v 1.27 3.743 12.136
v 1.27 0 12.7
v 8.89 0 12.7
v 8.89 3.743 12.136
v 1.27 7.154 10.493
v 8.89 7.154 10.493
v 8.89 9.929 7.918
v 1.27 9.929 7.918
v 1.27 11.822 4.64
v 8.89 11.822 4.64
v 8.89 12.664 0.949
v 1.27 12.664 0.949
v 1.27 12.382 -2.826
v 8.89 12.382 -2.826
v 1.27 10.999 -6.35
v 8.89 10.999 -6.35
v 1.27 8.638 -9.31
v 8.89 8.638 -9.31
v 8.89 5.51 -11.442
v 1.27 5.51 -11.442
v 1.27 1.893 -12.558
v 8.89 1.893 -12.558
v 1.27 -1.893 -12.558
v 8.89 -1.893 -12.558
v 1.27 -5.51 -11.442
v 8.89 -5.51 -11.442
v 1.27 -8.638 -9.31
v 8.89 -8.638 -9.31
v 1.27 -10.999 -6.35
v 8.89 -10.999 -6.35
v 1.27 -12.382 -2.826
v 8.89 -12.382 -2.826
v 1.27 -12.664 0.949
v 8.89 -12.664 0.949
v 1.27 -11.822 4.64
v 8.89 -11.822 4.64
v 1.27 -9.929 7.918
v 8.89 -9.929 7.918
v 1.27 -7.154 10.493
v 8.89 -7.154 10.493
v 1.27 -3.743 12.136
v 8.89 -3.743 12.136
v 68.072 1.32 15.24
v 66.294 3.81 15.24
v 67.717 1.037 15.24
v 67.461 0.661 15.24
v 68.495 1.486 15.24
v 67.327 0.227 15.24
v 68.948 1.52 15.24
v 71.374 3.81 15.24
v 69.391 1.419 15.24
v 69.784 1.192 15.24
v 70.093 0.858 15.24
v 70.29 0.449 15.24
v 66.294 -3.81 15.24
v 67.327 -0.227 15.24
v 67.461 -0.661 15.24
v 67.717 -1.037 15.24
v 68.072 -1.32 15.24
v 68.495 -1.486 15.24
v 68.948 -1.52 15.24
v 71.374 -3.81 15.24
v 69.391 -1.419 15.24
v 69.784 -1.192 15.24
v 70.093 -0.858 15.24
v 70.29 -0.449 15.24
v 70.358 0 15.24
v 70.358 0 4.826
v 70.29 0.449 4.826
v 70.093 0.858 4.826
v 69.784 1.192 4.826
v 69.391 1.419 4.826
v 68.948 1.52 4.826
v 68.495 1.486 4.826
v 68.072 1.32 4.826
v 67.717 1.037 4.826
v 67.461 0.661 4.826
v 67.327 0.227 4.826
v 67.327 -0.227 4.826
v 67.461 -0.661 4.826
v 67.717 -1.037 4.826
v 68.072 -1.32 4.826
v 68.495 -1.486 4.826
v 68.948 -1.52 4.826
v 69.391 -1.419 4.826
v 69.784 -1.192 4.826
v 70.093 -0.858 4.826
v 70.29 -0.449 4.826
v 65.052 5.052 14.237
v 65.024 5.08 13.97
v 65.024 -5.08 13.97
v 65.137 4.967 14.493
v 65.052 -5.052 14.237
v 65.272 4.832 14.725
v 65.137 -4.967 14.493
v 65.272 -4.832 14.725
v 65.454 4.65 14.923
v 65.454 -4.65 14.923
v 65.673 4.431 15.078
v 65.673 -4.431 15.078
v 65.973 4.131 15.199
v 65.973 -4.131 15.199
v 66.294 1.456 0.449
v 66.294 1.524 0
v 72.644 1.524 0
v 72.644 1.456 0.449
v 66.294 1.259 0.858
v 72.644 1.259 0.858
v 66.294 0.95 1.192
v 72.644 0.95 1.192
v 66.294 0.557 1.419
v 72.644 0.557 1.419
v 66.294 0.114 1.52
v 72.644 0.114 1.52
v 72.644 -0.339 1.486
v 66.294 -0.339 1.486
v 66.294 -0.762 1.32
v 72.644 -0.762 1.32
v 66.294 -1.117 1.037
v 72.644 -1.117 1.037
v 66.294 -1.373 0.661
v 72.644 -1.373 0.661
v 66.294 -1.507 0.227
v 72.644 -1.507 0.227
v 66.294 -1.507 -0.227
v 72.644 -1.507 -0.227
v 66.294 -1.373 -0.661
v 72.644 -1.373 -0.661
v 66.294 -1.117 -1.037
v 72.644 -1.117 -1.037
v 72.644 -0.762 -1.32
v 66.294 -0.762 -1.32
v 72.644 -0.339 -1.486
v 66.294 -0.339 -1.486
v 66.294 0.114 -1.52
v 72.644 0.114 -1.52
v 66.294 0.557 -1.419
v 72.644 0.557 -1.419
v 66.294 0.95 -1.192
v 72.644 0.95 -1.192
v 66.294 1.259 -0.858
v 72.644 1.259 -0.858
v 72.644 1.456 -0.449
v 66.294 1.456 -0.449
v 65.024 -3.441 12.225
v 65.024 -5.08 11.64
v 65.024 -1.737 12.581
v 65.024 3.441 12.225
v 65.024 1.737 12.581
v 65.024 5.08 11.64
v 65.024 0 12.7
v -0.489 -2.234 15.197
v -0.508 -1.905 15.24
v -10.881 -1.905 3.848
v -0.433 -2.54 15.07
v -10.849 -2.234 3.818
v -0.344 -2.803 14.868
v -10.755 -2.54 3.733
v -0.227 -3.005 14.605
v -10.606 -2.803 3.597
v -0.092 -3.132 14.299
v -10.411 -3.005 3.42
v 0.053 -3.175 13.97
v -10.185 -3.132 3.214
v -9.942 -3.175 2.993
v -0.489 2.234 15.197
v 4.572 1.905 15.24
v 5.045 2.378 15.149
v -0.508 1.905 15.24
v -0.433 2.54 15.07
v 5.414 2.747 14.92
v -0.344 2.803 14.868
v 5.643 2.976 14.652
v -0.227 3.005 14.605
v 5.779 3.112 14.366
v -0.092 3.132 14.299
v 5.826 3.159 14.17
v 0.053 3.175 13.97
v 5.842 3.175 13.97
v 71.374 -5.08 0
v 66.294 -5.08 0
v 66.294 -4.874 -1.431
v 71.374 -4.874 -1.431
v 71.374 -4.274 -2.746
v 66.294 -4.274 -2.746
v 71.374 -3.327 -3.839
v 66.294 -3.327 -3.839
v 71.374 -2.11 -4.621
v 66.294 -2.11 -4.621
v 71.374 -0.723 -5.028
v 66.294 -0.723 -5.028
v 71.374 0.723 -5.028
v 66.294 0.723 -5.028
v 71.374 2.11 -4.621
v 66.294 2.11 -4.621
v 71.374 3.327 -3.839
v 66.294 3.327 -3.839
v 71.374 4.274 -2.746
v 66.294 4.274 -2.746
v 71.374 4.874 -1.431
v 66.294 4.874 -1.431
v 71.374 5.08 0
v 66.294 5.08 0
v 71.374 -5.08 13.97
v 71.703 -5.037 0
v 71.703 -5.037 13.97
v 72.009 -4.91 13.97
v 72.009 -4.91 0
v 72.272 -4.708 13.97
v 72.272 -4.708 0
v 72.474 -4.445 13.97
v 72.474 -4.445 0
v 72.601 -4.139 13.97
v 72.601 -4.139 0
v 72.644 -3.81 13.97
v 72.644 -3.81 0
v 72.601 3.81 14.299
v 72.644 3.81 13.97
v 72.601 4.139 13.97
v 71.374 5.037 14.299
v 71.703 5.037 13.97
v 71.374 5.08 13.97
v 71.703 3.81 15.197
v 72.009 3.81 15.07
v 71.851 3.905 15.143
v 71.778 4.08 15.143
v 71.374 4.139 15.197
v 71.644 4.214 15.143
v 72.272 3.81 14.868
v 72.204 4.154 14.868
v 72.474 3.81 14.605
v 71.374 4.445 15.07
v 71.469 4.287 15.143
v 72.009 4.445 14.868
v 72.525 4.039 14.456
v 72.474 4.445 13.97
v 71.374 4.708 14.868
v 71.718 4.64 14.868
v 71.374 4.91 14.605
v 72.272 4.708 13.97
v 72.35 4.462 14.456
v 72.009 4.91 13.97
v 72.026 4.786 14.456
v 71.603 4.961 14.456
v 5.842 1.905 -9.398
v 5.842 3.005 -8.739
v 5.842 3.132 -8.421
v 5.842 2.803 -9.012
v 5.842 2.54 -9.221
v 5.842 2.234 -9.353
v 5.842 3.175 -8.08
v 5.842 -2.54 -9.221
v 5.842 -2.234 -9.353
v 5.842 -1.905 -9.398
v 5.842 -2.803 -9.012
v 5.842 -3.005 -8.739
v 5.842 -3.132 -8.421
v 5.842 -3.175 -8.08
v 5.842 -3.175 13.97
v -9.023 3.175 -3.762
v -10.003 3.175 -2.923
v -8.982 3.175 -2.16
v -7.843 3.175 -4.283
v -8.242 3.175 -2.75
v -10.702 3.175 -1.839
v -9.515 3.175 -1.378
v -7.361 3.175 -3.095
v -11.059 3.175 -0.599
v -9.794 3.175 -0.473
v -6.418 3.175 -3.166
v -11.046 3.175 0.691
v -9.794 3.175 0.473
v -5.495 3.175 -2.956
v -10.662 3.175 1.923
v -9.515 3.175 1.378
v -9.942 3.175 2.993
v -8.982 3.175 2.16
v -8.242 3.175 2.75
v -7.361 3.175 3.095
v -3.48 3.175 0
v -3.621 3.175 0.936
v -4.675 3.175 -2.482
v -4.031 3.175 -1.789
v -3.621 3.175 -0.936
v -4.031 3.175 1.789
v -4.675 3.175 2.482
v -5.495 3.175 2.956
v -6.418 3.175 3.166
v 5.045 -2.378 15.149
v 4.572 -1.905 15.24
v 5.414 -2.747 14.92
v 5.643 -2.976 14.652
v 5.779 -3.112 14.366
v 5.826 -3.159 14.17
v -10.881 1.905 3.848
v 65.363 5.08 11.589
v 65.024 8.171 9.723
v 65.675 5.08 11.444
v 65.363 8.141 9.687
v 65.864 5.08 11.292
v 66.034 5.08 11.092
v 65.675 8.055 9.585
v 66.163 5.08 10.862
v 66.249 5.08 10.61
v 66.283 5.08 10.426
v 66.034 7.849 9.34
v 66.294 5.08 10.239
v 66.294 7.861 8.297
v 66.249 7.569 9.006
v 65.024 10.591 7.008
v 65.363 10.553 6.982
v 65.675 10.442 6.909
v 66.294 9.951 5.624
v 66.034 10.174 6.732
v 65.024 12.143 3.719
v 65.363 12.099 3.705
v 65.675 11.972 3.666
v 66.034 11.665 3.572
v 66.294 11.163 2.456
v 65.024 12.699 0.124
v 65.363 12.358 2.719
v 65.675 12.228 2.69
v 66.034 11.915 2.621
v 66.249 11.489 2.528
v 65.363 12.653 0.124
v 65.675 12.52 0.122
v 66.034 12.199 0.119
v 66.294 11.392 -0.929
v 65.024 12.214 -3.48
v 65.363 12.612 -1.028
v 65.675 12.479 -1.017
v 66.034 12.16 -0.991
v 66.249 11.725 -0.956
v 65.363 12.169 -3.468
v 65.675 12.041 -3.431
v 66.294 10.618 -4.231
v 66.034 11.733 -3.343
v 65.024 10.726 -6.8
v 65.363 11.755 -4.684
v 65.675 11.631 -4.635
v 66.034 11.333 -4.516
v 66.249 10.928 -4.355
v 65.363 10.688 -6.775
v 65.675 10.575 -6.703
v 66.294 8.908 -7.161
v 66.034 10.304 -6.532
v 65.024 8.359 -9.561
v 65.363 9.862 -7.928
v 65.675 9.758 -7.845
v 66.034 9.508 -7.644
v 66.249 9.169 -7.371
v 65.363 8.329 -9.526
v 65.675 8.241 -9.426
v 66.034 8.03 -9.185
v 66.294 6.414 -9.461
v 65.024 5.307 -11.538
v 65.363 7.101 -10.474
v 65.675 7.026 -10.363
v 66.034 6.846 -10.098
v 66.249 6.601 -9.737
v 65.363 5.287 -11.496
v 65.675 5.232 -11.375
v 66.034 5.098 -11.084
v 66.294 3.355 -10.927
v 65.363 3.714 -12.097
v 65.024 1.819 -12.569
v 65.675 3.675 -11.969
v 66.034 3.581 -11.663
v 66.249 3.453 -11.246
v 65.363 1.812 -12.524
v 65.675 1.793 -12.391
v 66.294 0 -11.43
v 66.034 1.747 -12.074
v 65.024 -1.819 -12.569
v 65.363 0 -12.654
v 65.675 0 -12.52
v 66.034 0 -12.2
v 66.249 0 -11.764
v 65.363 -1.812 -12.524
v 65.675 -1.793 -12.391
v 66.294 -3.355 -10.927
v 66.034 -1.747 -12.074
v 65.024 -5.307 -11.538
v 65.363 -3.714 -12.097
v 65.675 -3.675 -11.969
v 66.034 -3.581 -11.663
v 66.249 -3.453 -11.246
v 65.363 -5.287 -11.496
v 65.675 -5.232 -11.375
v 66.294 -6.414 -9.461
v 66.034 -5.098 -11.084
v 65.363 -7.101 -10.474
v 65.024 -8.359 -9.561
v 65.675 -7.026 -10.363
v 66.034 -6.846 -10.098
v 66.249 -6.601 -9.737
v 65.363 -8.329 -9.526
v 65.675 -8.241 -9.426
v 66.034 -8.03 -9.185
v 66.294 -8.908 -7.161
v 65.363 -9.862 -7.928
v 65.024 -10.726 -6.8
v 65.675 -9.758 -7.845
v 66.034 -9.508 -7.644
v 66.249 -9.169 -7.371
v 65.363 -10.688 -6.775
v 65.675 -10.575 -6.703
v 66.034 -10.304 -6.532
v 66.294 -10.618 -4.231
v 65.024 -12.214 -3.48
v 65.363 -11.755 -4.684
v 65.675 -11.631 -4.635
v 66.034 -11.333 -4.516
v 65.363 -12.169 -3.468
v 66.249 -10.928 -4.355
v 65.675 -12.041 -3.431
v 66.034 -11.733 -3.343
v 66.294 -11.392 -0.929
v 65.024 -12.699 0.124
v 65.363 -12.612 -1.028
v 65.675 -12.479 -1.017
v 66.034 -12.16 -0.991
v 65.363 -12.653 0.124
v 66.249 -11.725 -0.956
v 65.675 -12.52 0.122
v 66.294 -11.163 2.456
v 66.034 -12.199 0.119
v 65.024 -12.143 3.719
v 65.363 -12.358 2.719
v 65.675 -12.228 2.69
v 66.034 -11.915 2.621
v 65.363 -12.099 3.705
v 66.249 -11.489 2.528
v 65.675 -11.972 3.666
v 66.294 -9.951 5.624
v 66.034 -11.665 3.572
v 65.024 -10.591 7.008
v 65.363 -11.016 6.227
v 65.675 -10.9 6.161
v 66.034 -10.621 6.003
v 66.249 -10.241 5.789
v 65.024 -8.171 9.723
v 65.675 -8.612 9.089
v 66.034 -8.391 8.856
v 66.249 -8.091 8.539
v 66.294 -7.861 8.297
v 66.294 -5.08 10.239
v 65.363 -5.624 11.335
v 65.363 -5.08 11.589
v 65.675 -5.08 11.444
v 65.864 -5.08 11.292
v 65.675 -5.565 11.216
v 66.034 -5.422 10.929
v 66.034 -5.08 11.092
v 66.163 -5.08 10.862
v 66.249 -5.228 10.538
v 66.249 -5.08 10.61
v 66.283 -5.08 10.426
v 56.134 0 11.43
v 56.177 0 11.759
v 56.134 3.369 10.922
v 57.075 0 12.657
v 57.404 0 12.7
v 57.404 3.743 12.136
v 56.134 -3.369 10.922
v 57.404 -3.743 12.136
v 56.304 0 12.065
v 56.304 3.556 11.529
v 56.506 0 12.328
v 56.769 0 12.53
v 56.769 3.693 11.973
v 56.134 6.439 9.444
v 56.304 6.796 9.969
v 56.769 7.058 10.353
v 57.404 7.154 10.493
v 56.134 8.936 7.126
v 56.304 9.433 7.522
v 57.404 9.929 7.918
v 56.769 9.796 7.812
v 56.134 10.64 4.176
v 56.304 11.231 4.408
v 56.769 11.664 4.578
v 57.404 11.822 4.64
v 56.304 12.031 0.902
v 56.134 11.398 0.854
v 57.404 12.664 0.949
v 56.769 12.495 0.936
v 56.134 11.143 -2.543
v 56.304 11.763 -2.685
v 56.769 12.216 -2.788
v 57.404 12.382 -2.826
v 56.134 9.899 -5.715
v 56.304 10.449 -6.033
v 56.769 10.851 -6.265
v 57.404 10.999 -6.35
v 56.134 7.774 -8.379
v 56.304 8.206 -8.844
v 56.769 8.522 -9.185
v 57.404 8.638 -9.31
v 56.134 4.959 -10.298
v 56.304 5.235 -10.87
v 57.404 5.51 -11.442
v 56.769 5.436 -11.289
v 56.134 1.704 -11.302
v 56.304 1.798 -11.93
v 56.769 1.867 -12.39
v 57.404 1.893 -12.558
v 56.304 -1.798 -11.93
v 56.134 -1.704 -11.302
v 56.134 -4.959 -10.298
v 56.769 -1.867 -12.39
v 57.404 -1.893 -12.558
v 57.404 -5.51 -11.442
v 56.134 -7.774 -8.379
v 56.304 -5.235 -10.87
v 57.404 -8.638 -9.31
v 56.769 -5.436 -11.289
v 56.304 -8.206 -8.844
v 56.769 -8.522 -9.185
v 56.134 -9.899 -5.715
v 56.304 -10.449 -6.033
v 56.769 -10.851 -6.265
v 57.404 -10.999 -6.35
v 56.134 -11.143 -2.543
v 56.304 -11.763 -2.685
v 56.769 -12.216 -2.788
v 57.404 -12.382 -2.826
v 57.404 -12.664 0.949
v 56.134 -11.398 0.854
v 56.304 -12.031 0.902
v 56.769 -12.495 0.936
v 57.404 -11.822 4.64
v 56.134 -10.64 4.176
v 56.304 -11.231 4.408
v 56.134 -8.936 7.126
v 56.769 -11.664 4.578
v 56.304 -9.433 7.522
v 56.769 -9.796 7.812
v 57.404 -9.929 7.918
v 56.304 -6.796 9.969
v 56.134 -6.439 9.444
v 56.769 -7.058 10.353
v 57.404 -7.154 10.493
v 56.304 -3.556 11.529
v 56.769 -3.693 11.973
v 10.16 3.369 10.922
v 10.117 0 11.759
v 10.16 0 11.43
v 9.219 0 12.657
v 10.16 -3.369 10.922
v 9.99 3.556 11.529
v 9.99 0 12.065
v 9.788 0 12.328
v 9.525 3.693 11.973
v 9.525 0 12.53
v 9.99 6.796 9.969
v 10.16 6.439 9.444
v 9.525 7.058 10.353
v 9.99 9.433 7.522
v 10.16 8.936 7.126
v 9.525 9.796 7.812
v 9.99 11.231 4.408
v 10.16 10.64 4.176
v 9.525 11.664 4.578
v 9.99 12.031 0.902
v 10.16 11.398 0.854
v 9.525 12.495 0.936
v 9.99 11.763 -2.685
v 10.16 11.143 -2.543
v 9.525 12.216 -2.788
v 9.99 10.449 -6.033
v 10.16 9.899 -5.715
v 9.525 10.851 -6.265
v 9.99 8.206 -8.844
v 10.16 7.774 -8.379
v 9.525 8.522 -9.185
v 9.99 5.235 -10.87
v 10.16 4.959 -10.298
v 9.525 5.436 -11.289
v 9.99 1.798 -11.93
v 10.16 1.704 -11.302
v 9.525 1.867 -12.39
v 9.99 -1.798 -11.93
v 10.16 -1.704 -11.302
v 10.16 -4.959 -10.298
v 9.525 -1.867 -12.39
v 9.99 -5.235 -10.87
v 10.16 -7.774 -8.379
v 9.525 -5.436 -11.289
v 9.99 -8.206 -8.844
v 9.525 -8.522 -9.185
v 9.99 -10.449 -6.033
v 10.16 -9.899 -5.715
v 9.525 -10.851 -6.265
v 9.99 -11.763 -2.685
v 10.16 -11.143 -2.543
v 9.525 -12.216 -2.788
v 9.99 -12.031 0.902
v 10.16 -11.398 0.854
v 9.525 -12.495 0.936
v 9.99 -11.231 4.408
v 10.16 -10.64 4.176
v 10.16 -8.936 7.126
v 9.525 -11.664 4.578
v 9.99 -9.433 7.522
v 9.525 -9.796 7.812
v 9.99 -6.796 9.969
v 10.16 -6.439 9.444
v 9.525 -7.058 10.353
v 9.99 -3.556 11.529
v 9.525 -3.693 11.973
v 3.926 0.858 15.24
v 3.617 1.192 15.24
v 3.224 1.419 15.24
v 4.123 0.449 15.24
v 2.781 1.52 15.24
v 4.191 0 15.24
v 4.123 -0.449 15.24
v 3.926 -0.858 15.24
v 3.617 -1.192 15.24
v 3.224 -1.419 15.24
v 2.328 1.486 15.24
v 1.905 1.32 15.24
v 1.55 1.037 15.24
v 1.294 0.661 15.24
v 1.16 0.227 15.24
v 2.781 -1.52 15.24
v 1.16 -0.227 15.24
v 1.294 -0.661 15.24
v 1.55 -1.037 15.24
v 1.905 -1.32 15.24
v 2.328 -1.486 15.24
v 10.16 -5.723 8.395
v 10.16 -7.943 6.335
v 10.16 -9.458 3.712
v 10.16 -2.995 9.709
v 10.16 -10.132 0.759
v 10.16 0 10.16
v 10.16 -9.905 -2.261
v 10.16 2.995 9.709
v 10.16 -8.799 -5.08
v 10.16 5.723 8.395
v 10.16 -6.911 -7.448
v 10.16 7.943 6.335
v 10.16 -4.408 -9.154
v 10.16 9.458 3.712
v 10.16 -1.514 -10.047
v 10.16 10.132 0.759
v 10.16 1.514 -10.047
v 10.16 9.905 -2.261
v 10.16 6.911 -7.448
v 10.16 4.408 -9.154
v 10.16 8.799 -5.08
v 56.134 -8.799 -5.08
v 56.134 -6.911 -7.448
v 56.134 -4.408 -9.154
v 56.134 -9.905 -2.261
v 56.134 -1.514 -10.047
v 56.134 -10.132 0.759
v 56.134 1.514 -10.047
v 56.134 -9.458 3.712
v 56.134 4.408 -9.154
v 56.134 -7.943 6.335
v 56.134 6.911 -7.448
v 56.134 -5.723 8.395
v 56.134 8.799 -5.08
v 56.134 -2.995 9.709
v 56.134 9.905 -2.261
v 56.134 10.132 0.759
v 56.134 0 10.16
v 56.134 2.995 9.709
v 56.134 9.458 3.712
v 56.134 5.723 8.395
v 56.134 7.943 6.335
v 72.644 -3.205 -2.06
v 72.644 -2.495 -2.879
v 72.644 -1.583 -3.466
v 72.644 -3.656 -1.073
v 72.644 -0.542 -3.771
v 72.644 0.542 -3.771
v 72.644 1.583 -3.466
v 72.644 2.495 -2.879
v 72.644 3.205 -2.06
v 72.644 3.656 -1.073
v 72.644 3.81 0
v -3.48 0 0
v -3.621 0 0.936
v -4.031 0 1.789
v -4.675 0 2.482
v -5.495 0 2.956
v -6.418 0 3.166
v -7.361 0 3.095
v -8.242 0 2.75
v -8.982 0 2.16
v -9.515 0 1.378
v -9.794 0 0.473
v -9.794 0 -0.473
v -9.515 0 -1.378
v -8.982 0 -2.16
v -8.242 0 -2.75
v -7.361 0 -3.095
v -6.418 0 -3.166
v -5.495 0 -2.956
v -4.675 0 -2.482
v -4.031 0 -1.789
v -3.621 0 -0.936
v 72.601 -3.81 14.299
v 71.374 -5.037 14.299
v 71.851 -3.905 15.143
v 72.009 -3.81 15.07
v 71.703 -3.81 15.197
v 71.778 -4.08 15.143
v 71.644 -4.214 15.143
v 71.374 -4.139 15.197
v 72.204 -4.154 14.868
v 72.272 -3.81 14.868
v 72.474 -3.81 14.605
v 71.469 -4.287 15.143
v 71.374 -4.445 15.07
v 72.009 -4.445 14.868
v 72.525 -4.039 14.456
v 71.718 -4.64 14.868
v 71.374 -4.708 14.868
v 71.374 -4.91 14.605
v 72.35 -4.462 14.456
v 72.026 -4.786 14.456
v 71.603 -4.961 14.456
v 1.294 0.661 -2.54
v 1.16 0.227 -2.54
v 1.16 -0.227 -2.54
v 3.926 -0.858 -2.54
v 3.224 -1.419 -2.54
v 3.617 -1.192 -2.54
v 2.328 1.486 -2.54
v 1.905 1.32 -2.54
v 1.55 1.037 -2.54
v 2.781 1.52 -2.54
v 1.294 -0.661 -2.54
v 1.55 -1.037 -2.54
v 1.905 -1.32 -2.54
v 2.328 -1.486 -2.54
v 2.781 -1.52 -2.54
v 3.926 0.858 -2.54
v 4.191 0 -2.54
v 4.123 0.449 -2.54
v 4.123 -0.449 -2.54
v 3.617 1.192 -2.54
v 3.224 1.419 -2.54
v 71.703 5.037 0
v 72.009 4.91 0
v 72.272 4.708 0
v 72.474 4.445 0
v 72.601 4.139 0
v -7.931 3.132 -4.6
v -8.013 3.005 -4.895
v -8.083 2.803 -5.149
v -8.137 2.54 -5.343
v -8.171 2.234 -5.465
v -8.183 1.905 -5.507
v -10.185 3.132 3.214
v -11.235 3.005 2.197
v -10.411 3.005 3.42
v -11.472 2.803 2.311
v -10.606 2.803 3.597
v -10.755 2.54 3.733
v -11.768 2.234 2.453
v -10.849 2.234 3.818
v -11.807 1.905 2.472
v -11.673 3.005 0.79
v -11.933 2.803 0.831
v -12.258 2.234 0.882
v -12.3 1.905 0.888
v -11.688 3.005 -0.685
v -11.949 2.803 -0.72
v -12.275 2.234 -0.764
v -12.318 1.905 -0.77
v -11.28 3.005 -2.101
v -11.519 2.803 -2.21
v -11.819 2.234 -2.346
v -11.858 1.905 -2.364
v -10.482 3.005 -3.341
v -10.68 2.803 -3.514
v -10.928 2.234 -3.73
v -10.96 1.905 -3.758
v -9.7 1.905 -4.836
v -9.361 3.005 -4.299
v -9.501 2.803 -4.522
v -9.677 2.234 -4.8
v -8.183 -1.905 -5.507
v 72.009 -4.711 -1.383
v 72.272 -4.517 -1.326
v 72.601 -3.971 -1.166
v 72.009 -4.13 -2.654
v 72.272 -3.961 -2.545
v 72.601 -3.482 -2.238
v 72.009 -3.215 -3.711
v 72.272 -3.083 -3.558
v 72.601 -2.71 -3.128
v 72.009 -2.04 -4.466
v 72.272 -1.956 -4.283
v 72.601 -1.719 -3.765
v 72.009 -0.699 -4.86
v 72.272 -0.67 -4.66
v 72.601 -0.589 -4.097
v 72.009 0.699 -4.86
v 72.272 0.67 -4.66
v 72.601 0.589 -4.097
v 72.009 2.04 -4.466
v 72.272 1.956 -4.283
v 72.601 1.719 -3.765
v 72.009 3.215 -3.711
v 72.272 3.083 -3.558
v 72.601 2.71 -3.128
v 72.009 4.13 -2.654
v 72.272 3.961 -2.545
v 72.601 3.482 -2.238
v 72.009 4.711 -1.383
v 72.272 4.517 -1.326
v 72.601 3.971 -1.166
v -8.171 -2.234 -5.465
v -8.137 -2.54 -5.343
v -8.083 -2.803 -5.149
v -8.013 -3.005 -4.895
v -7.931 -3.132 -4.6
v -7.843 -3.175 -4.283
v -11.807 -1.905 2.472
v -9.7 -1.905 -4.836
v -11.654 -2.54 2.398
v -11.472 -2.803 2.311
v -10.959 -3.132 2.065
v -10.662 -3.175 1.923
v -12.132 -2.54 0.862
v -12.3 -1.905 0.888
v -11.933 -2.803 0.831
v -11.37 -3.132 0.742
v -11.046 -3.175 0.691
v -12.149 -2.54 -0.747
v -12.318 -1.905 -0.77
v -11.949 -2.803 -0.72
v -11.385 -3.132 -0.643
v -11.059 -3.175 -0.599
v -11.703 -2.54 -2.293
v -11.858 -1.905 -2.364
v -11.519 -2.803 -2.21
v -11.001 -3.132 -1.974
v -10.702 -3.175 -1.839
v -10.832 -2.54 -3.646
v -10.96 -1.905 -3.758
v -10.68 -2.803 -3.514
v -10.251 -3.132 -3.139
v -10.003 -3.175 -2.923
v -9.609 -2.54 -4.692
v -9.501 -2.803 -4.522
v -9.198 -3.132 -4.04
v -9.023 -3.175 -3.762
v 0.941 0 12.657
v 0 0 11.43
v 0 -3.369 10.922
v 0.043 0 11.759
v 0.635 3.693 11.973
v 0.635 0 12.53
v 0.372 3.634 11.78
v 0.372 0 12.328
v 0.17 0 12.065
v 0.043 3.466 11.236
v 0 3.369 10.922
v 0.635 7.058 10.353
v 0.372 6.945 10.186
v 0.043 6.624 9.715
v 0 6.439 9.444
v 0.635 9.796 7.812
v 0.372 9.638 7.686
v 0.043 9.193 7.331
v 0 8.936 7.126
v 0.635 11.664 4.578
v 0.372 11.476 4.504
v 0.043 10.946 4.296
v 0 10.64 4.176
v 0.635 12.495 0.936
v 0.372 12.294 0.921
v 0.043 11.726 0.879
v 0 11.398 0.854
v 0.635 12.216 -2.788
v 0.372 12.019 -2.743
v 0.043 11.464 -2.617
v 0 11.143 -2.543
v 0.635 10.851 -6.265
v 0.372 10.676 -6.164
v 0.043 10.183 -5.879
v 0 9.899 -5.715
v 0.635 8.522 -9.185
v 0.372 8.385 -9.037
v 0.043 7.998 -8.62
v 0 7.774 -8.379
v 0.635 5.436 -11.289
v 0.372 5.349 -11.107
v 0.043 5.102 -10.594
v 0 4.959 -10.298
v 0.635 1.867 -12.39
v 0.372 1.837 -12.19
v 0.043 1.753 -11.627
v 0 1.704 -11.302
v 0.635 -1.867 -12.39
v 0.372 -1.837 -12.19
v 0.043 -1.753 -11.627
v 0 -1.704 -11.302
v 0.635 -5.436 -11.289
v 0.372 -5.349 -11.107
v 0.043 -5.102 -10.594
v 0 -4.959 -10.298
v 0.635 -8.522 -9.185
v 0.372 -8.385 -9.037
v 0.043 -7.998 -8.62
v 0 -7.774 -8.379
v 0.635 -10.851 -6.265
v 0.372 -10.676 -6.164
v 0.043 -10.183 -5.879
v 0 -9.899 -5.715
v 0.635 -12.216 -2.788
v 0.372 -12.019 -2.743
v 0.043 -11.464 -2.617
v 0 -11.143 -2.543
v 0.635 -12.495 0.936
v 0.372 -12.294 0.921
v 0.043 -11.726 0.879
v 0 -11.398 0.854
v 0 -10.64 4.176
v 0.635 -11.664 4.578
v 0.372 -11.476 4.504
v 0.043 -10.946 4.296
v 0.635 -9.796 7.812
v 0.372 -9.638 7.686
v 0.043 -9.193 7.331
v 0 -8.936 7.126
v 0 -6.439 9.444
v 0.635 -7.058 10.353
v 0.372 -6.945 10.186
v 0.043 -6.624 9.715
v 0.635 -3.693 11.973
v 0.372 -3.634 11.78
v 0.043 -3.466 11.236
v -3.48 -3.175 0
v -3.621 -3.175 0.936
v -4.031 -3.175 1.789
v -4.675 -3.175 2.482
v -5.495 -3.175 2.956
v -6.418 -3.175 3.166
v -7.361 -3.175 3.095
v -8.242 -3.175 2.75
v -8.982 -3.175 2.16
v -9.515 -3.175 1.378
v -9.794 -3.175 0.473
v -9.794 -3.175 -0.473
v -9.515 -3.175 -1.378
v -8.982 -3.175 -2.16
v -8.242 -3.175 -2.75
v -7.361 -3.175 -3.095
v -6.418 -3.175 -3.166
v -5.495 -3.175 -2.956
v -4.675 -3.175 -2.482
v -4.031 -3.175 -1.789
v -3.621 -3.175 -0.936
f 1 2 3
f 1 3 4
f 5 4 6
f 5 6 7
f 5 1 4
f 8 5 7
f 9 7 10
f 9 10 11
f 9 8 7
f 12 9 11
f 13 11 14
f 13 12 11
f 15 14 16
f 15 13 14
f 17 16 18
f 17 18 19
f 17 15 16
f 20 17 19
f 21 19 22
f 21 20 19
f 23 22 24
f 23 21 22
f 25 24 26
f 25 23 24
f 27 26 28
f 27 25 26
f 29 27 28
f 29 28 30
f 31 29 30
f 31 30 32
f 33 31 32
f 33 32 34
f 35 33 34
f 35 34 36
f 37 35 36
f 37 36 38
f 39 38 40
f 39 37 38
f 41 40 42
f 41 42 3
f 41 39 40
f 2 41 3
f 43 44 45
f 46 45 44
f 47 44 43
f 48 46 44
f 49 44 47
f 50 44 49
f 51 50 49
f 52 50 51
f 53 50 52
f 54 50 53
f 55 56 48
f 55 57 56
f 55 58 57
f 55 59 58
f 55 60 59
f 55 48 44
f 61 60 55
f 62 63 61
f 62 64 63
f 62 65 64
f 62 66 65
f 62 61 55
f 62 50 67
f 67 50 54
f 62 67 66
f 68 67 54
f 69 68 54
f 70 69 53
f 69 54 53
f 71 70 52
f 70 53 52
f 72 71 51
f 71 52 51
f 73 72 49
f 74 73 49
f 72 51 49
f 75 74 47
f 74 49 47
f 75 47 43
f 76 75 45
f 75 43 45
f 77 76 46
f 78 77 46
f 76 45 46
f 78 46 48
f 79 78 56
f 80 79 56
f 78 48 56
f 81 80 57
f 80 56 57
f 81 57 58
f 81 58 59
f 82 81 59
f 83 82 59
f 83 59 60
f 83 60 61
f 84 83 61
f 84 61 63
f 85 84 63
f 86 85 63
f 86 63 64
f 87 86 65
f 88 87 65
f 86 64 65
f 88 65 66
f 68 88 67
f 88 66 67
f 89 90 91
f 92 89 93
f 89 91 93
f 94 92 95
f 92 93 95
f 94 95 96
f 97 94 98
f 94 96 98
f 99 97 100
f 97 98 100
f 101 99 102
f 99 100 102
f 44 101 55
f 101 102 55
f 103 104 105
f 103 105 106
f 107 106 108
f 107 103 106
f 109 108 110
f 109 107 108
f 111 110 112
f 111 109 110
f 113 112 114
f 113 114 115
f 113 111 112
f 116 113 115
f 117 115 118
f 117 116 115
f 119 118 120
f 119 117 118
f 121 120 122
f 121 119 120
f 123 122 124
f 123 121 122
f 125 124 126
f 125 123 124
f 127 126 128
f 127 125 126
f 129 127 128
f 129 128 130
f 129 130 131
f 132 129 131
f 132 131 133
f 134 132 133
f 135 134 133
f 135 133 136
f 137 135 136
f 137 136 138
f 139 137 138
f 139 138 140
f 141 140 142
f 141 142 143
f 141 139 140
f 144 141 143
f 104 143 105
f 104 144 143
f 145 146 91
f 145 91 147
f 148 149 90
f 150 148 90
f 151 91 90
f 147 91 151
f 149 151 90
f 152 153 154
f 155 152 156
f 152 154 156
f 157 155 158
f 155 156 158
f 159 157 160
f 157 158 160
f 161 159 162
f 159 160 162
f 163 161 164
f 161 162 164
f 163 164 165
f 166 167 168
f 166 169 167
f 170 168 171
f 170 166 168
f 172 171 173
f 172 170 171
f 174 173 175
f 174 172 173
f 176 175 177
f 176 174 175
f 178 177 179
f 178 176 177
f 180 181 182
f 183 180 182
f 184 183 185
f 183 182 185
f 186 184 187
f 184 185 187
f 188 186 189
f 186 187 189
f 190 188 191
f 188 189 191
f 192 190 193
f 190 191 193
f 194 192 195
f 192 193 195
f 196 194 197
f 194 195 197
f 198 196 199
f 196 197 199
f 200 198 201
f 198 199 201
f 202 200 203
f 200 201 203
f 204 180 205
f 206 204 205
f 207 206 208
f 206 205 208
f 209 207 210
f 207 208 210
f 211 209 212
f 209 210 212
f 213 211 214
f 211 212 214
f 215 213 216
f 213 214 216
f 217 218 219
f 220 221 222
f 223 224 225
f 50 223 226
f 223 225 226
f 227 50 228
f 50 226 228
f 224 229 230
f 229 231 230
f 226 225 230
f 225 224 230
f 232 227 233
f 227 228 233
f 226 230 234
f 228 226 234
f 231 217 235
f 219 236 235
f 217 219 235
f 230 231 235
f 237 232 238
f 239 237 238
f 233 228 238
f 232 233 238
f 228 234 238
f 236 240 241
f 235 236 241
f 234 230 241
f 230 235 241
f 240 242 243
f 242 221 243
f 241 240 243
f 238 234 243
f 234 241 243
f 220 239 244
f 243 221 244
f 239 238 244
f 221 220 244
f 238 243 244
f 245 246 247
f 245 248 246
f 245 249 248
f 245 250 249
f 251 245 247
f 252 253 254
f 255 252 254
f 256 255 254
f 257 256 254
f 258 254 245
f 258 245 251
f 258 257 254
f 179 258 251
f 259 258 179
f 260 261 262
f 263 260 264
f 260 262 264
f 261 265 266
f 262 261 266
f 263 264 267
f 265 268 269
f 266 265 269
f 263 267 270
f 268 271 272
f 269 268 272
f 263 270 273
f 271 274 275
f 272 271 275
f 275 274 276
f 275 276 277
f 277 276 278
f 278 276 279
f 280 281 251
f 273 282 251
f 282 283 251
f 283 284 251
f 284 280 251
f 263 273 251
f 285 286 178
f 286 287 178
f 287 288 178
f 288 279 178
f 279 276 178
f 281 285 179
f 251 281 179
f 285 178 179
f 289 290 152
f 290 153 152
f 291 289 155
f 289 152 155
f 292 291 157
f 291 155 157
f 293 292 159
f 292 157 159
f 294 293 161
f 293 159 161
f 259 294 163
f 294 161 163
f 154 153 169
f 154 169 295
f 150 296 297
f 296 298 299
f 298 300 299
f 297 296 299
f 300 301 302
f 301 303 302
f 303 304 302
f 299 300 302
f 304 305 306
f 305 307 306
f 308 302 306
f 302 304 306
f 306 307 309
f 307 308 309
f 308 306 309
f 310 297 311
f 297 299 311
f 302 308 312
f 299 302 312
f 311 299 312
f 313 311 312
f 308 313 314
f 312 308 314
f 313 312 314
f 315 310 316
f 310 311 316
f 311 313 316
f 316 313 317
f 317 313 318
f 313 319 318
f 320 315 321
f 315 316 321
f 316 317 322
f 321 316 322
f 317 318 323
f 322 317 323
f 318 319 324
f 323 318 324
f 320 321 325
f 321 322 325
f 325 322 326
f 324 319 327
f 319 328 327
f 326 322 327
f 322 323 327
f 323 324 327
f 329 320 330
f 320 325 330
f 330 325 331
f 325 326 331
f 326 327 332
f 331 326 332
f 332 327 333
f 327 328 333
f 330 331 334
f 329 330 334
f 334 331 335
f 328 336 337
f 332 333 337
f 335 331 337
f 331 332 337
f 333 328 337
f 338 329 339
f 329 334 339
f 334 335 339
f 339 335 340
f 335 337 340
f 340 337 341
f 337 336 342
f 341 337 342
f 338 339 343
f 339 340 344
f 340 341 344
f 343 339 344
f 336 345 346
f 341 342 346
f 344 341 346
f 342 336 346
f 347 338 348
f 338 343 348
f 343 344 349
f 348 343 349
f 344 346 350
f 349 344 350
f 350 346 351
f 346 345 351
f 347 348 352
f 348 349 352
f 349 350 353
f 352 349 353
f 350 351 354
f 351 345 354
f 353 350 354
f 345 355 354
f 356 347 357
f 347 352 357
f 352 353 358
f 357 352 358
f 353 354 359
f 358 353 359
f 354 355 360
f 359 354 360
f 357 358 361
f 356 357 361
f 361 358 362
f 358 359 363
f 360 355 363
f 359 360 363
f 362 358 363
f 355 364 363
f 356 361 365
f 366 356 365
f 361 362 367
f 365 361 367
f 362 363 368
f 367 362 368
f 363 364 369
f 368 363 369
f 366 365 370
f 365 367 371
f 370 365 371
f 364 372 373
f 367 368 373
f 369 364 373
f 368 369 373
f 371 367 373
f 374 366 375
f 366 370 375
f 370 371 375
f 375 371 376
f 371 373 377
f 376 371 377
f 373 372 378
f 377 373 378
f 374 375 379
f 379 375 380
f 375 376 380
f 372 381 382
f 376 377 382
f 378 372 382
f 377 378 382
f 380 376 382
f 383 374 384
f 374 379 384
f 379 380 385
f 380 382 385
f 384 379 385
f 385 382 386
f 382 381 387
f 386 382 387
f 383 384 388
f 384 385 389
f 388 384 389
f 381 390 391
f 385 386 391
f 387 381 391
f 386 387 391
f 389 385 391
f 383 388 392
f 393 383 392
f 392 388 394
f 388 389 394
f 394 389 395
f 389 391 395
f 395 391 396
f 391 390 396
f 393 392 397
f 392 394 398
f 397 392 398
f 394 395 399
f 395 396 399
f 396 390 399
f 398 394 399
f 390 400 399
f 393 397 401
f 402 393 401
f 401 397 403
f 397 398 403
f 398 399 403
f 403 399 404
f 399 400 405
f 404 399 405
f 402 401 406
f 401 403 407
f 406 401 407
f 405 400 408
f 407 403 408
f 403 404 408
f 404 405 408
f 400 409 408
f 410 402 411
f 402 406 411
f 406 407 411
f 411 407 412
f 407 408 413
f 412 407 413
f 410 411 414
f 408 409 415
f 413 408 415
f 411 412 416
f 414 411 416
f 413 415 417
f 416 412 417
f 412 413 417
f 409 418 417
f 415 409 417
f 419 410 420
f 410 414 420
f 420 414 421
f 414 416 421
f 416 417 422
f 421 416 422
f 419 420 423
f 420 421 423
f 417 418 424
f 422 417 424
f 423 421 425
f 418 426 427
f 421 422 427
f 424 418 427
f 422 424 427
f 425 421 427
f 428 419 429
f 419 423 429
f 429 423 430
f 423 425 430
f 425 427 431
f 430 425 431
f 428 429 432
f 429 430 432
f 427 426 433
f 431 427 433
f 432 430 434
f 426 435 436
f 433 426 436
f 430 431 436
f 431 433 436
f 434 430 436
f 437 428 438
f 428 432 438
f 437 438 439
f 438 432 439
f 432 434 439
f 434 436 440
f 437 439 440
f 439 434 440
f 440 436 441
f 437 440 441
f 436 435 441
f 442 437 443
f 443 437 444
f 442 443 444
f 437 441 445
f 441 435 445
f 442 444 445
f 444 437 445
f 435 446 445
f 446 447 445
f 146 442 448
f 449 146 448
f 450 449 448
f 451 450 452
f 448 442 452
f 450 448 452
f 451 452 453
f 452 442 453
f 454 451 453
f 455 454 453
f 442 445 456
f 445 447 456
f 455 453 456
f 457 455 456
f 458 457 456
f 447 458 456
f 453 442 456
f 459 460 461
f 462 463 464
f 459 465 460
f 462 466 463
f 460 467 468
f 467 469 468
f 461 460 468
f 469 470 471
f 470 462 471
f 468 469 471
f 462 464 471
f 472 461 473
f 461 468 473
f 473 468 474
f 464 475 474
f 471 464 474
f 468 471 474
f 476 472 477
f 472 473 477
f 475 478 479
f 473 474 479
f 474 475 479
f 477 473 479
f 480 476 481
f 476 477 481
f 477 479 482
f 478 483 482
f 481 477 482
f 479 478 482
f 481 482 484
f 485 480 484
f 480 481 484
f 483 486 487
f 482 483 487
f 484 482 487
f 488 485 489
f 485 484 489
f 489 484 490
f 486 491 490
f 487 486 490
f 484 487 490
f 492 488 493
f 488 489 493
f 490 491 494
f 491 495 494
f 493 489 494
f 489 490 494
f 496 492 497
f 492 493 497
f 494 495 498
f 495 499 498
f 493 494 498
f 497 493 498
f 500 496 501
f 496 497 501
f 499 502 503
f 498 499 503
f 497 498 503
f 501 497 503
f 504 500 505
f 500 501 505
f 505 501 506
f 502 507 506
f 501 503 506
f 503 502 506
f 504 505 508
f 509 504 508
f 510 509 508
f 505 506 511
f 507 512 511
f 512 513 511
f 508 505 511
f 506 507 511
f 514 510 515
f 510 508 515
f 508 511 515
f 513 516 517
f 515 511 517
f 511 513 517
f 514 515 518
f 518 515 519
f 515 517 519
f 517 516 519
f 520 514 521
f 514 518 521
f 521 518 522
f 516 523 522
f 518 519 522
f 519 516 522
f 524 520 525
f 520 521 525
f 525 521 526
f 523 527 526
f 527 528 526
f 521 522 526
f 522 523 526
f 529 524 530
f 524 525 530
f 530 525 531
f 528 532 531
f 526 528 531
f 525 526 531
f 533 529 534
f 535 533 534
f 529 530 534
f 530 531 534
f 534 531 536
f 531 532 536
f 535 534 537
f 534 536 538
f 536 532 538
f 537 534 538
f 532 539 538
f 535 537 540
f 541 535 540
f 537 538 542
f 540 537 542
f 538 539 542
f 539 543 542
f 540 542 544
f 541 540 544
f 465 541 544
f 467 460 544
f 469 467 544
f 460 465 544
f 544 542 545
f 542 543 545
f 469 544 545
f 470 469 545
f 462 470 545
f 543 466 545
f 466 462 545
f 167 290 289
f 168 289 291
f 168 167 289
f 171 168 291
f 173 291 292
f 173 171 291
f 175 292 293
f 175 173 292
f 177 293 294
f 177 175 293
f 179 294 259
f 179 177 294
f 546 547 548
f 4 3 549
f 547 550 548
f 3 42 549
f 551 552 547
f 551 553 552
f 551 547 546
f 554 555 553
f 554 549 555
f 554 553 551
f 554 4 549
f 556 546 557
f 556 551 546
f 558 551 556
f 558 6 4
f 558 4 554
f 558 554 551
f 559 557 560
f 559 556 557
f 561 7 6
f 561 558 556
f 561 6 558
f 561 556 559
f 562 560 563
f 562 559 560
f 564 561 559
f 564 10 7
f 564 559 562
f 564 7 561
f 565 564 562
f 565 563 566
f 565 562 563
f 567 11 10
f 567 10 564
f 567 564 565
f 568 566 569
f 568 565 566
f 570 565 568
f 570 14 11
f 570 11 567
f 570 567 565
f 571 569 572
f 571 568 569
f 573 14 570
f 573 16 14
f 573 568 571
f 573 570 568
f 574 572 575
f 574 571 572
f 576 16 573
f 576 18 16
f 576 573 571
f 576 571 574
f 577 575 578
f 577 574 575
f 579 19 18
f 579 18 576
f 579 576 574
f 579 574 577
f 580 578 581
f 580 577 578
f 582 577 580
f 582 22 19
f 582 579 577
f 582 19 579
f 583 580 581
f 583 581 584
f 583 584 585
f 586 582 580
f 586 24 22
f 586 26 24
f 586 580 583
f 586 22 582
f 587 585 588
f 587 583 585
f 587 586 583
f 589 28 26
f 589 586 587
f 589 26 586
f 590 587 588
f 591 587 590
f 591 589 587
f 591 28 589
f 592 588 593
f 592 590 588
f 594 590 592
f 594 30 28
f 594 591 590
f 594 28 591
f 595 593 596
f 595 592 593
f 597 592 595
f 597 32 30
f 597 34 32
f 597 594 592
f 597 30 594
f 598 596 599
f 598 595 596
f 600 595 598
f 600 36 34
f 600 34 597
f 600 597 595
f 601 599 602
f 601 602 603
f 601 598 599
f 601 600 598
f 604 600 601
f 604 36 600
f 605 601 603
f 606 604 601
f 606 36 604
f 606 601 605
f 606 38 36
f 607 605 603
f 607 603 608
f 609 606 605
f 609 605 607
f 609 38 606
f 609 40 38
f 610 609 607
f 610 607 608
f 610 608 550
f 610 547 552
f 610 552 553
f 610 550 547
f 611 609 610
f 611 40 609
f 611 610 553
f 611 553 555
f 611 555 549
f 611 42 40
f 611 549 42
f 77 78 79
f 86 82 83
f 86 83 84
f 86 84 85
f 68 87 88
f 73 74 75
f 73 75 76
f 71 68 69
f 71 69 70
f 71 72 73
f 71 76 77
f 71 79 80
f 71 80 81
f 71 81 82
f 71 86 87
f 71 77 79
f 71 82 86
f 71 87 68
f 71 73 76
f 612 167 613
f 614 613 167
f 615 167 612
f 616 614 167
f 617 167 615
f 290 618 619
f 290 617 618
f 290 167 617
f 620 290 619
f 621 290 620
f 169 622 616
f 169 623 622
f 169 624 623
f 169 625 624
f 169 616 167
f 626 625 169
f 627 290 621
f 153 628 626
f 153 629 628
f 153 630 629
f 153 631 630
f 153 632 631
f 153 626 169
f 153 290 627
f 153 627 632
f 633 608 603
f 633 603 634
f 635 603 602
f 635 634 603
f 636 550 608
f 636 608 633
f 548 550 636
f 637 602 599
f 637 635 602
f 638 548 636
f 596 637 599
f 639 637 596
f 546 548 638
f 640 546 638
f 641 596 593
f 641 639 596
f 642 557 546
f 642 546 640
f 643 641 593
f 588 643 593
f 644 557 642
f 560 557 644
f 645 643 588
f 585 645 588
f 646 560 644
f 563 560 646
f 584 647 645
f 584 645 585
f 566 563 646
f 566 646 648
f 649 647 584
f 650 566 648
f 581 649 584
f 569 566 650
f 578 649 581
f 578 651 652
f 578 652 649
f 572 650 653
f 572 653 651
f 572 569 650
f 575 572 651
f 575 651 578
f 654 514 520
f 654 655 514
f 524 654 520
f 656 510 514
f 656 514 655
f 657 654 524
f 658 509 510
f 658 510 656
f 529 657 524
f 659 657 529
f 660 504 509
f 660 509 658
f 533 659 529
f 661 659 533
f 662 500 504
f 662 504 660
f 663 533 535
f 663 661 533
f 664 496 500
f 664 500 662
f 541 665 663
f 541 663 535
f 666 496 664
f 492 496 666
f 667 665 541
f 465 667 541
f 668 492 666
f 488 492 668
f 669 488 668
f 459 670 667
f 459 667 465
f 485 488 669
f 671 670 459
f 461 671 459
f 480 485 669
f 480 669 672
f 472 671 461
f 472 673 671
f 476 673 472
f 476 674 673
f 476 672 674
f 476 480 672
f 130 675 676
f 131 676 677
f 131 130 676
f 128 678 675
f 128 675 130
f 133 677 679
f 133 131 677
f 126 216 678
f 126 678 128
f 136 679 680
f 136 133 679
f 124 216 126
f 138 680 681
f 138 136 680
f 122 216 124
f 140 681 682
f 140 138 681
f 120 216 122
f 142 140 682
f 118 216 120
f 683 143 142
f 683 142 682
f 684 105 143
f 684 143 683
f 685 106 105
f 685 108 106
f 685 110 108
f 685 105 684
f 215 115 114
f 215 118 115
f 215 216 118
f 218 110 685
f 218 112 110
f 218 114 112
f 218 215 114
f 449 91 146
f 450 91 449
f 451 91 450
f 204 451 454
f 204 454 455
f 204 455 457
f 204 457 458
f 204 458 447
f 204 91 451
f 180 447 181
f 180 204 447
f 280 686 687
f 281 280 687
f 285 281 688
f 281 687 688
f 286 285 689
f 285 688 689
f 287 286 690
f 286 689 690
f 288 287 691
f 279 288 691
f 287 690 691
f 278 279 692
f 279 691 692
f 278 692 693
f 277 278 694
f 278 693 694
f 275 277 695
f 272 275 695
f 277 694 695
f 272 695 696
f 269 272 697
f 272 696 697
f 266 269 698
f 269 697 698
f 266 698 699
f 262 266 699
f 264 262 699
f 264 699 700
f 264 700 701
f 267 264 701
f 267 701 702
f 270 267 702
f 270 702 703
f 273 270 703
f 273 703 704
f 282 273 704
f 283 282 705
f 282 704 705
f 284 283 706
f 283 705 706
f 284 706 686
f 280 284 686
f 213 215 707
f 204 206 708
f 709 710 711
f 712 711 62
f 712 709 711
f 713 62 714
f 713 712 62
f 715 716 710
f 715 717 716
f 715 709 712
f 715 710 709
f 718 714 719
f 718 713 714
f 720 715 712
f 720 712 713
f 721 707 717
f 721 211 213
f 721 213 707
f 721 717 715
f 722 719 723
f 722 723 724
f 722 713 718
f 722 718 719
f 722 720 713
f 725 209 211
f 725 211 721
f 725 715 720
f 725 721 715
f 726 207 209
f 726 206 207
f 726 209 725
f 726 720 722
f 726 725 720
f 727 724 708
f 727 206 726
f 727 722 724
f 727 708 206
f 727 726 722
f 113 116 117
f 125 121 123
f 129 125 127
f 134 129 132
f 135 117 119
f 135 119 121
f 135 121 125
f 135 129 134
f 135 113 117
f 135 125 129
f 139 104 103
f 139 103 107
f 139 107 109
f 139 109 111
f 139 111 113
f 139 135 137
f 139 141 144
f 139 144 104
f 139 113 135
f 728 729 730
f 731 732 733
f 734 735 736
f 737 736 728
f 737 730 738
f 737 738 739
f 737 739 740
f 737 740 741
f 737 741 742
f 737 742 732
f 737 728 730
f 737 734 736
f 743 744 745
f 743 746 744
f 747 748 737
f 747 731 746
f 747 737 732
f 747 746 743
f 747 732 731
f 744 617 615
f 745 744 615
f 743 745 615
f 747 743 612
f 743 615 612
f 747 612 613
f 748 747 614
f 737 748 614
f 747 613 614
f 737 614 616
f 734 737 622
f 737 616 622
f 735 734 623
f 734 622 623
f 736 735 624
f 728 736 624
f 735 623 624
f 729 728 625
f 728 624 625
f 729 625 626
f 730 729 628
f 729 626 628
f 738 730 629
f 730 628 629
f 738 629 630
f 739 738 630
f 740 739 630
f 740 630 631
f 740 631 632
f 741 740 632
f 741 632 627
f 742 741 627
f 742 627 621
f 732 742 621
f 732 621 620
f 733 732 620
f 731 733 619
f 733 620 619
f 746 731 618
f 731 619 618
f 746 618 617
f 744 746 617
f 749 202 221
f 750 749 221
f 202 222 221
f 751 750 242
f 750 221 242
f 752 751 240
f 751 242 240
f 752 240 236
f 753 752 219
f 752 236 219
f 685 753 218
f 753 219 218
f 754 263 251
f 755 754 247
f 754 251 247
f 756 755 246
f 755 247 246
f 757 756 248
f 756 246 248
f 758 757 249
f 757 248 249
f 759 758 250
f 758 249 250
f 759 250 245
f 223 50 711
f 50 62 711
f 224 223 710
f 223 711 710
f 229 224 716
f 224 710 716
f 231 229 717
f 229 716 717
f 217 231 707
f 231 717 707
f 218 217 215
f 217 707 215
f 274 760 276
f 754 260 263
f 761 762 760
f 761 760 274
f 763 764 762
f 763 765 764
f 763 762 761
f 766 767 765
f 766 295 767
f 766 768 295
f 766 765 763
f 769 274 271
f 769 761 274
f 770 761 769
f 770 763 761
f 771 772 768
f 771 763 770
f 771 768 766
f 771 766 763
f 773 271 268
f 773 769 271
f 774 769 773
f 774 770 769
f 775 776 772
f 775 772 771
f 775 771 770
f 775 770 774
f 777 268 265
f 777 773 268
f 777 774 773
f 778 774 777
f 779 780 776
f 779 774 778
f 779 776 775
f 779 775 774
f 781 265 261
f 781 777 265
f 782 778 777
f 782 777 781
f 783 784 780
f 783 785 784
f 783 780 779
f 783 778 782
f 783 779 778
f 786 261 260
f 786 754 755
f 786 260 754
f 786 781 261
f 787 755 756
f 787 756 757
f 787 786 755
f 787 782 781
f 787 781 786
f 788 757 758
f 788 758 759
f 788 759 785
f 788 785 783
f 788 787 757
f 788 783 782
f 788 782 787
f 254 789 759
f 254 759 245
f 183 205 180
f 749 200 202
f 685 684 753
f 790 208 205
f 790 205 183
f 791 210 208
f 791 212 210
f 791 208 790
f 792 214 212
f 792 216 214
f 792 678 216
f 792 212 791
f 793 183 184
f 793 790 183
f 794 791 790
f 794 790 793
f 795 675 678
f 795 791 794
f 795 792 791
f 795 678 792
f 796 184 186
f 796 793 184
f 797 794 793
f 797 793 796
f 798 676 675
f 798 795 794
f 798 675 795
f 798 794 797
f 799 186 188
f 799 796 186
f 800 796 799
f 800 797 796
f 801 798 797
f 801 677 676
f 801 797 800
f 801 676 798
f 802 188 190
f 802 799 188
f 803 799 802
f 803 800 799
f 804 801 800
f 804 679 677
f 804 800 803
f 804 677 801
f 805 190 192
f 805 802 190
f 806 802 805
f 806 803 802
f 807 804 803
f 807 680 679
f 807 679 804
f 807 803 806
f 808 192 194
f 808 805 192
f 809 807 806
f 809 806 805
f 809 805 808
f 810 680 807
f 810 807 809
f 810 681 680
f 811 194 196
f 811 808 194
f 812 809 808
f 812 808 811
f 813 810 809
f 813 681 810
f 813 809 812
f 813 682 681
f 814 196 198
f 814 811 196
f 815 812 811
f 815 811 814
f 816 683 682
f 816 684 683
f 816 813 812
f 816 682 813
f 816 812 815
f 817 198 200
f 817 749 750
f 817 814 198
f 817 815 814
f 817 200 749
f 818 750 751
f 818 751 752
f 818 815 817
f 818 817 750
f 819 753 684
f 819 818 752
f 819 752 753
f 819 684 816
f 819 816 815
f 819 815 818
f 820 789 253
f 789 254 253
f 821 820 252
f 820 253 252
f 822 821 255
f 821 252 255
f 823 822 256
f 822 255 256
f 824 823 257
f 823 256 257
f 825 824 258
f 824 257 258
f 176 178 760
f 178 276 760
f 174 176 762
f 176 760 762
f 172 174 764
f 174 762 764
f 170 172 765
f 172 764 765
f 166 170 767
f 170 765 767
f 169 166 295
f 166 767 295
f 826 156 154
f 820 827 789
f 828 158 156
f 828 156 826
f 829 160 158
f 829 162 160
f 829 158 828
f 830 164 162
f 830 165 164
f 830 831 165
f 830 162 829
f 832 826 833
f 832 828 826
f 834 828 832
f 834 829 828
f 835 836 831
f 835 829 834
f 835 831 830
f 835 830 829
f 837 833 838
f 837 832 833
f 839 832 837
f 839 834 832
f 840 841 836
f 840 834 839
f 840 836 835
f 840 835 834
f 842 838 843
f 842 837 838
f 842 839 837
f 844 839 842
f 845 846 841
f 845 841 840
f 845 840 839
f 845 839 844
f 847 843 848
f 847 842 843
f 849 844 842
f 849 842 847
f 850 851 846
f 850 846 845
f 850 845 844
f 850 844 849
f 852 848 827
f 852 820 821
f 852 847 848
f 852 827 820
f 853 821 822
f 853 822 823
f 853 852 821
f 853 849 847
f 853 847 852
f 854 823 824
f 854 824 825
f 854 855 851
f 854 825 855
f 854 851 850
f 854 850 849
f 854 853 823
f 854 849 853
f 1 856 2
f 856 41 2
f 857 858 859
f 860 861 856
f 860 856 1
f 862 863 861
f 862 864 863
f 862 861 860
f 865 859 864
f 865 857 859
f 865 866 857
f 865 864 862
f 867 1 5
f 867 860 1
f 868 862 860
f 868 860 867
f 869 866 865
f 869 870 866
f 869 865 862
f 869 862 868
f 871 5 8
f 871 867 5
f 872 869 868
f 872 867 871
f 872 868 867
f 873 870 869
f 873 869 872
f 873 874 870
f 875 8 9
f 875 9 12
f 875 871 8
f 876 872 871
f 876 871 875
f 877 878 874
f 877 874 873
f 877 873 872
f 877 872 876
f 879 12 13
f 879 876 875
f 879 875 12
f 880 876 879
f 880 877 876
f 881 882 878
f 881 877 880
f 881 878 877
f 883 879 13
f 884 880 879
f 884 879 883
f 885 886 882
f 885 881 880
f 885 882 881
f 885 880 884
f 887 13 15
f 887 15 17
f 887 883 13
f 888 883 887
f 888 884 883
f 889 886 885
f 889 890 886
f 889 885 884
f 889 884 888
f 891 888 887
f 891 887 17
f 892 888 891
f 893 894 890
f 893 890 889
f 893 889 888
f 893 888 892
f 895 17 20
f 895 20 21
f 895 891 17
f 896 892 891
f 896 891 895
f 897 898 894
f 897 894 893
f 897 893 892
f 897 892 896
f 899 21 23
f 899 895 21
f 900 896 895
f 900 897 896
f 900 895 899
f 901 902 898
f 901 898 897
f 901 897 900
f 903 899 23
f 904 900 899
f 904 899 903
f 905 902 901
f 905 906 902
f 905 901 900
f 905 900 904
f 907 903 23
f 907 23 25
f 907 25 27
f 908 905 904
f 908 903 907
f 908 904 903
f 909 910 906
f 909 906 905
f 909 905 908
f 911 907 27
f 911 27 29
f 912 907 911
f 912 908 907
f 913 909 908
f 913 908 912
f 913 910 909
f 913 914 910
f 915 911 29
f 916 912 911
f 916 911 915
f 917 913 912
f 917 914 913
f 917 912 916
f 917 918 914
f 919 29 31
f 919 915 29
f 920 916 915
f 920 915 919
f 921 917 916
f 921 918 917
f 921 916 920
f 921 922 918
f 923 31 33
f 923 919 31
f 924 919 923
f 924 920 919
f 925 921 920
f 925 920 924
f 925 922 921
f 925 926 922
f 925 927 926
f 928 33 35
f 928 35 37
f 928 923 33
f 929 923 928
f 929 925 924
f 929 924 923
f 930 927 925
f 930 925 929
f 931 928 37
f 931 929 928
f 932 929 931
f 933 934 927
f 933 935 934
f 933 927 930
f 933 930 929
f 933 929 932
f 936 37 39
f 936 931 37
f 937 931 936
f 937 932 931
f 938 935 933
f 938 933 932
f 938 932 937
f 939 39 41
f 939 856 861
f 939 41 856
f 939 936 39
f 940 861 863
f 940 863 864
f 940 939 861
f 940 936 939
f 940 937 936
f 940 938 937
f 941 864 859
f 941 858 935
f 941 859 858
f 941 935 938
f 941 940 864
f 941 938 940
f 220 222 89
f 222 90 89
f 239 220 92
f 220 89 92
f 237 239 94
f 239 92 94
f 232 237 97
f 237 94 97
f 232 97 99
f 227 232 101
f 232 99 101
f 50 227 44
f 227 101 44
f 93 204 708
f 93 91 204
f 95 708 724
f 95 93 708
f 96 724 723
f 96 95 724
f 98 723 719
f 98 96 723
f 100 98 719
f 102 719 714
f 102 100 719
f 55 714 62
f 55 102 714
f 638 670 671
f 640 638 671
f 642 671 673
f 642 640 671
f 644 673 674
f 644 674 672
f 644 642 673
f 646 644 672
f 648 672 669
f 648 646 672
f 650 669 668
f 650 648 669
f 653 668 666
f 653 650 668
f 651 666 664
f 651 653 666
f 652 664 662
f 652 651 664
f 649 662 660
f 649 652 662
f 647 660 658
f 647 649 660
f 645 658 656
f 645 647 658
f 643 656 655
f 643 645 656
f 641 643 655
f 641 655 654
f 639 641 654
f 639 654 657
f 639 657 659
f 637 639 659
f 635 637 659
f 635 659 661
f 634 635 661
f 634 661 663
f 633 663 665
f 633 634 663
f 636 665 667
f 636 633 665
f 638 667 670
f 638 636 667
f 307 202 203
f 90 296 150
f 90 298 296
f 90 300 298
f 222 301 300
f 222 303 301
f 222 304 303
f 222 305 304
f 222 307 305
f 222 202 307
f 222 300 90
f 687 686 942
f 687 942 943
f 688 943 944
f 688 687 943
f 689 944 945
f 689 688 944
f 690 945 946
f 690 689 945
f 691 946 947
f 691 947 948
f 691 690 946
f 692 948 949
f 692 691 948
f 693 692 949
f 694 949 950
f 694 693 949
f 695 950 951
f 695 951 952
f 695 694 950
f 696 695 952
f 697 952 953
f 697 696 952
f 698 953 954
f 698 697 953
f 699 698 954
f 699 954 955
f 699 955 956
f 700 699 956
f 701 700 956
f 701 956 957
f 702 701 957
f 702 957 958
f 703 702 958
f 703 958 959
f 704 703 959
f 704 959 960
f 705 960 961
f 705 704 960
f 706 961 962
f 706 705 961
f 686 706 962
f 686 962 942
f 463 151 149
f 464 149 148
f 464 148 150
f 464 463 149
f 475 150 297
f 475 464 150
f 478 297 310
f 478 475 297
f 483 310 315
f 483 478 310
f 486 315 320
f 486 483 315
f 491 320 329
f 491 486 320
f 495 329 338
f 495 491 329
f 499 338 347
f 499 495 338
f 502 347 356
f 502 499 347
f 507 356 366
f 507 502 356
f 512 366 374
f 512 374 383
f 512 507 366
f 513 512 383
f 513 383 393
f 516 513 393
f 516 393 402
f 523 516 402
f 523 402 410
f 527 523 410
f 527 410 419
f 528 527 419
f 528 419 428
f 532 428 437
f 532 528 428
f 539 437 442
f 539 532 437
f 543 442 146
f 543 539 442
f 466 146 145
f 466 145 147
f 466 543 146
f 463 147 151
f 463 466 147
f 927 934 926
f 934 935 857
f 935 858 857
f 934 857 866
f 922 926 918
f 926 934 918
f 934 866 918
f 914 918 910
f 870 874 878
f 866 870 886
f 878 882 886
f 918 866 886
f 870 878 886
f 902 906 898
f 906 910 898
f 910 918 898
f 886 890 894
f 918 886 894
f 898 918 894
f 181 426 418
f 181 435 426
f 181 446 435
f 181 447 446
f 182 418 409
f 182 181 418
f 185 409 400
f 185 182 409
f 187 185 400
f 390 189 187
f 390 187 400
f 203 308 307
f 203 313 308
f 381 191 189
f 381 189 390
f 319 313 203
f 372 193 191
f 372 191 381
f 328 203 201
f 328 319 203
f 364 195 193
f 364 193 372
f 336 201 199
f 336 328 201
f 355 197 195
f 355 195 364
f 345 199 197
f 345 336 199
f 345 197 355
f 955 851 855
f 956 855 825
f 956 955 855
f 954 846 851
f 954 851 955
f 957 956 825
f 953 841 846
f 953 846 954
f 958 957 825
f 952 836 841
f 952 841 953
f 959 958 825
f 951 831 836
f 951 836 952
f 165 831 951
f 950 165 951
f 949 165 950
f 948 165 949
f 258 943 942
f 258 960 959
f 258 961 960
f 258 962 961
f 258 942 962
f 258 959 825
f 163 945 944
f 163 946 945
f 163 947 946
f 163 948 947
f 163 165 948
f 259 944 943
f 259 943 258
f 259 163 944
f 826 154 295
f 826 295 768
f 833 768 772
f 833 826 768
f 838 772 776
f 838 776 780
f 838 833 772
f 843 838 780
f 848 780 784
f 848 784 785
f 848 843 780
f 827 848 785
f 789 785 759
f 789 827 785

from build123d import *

# Parameters (mm, degrees)
F0_W          = 5.842
F0_H          = 12.7
F0_R          = 3.175
F2_DEPTH      = 3.175
F2_DEPTH_BACK = 3.175
F3_R          = 1.524
F4_DEPTH      = 6.35
F4_DEPTH_BACK = 1.27
F6_R          = 1.524
F7_DEPTH      = 17.78
F5_R          = 1.524
F8_DEPTH      = 10.414
F9_R          = 1.27
F9_2_R        = 1.27
F10_R         = 1.27


with BuildPart() as f1:
    # F0 (on Front) → F1 (revolve)
    with BuildSketch(Plane.XZ):
        Polygon((5.842, 12.7), (5.842, 0), (66.294, 0), (66.294, 12.7), (56.134, 12.7), (56.134, 10.16), (10.16, 10.16), (10.16, 12.7), align=None)
        with Locations((2.921, 6.35)):
            Rectangle(F0_W, F0_H)
    revolve(axis=Axis((33.147, 0, 0), (-1, 0, 0)))

    # F3 (on face) → F4 (join, two sides)
    with BuildSketch(Plane.YZ.offset(66.294)) as f4_sk:
        with BuildLine():
            ThreePointArc((-5.08, 0), (0, -5.08), (5.08, 0))
            ThreePointArc((5.08, 0), (0, 5.08), (-5.08, 0))
        make_face()
        Circle(F3_R, mode=Mode.SUBTRACT)
        with BuildLine():
            ThreePointArc((-5.08, 0), (0, 5.08), (5.08, 0))
            Line((5.08, 0), (5.08, 15.24))
            Line((5.08, 15.24), (-5.08, 15.24))
            Line((-5.08, 15.24), (-5.08, 0))
        make_face()
    extrude(amount=F4_DEPTH)
    extrude(f4_sk.sketch, amount=-F4_DEPTH_BACK)

    # F5 (on face) → F8 (cut)
    with BuildSketch(Plane.XY.offset(15.24)):
        with Locations((68.834, 0)):
            Circle(F5_R)
    extrude(amount=-F8_DEPTH, mode=Mode.SUBTRACT)

    # F9#2
    f9_2_edges = [f1.edges().sort_by_distance(p)[0] for p in [
        (0, 0, -12.7),
        (10.16, 0, -12.7),
    ]]
    fillet(f9_2_edges, radius=F9_2_R)

    # F10
    f10_edges = [f1.edges().sort_by_distance(p)[0] for p in [
        (72.644, -5.08, 7.62),
        (72.644, 0, -5.08),
        (72.644, 5.08, 7.62),
        (72.644, 0, 15.24),
        (65.024, 0, 15.24),
        (68.834, -5.08, 15.24),
        (68.834, 5.08, 15.24),
        (66.294, 0, -12.7),
        (56.134, 0, -12.7),
    ]]
    fillet(f10_edges, radius=F10_R)


with BuildPart() as f2:
    # F0 (on Front) → F2 (new body, two sides)
    with BuildSketch(Plane.XZ) as f2_sk:
        with BuildLine():
            Line((-0.9398, 0), (0, 0))
            Line((0, 0), (0, 12.7))
            Line((0, 12.7), (5.842, 12.7))
            Line((5.842, 12.7), (5.842, 15.24))
            Line((5.842, 15.24), (-0.508, 15.24))
            Line((-0.508, 15.24), (-10.8806298187, 3.8475430269))
            ThreePointArc((-10.8806298187, 3.8475430269), (-4.5919612295, 5.3297205562), (-0.9398, 0))
        make_face()
        with BuildLine():
            ThreePointArc((-8.1826630726, -5.5069827884), (-3.1957909266, -4.5493385486), (-0.9398, 0))
            ThreePointArc((-0.9398, 0), (-4.5919612295, 5.3297205562), (-10.8806298187, 3.8475430269))
            ThreePointArc((-10.8806298187, 3.8475430269), (-12.1459778134, -1.5837270034), (-8.1826630726, -5.5069827884))
        make_face()
        with Locations((-6.6548, 0)):
            Circle(F0_R, mode=Mode.SUBTRACT)
        with BuildLine():
            Line((5.842, 0), (0, 0))
            Line((0, 0), (-0.9398, 0))
            ThreePointArc((-0.9398, 0), (-3.1957909266, -4.5493385486), (-8.1826630726, -5.5069827884))
            Line((-8.1826630726, -5.5069827884), (5.842, -9.398))
            Line((5.842, -9.398), (5.842, 0))
        make_face()
        with Locations((2.921, 6.35)):
            Rectangle(F0_W, F0_H)
    extrude(amount=F2_DEPTH)
    extrude(f2_sk.sketch, amount=-F2_DEPTH_BACK)

    # F6 (on face) → F7 (cut)
    with BuildSketch(Plane.XY.offset(15.24)):
        with Locations((2.667, 0)):
            Circle(F6_R)
    extrude(amount=-F7_DEPTH, mode=Mode.SUBTRACT)

    # F9
    f9_edges = [f2.edges().sort_by_distance(p)[0] for p in [
        (-5.694315, -3.175, 9.543772),
        (-5.694315, 3.175, 9.543772),
        (-12.145978, 3.175, -1.583727),
        (-1.170332, -3.175, -7.452491),
        (-12.145978, -3.175, -1.583727),
        (-1.170332, 3.175, -7.452491),
        (2.667, -3.175, 15.24),
        (2.667, 3.175, 15.24),
        (5.842, 0, 15.24),
    ]]
    fillet(f9_edges, radius=F9_R)


solid = Compound([f1.part, f2.part])
